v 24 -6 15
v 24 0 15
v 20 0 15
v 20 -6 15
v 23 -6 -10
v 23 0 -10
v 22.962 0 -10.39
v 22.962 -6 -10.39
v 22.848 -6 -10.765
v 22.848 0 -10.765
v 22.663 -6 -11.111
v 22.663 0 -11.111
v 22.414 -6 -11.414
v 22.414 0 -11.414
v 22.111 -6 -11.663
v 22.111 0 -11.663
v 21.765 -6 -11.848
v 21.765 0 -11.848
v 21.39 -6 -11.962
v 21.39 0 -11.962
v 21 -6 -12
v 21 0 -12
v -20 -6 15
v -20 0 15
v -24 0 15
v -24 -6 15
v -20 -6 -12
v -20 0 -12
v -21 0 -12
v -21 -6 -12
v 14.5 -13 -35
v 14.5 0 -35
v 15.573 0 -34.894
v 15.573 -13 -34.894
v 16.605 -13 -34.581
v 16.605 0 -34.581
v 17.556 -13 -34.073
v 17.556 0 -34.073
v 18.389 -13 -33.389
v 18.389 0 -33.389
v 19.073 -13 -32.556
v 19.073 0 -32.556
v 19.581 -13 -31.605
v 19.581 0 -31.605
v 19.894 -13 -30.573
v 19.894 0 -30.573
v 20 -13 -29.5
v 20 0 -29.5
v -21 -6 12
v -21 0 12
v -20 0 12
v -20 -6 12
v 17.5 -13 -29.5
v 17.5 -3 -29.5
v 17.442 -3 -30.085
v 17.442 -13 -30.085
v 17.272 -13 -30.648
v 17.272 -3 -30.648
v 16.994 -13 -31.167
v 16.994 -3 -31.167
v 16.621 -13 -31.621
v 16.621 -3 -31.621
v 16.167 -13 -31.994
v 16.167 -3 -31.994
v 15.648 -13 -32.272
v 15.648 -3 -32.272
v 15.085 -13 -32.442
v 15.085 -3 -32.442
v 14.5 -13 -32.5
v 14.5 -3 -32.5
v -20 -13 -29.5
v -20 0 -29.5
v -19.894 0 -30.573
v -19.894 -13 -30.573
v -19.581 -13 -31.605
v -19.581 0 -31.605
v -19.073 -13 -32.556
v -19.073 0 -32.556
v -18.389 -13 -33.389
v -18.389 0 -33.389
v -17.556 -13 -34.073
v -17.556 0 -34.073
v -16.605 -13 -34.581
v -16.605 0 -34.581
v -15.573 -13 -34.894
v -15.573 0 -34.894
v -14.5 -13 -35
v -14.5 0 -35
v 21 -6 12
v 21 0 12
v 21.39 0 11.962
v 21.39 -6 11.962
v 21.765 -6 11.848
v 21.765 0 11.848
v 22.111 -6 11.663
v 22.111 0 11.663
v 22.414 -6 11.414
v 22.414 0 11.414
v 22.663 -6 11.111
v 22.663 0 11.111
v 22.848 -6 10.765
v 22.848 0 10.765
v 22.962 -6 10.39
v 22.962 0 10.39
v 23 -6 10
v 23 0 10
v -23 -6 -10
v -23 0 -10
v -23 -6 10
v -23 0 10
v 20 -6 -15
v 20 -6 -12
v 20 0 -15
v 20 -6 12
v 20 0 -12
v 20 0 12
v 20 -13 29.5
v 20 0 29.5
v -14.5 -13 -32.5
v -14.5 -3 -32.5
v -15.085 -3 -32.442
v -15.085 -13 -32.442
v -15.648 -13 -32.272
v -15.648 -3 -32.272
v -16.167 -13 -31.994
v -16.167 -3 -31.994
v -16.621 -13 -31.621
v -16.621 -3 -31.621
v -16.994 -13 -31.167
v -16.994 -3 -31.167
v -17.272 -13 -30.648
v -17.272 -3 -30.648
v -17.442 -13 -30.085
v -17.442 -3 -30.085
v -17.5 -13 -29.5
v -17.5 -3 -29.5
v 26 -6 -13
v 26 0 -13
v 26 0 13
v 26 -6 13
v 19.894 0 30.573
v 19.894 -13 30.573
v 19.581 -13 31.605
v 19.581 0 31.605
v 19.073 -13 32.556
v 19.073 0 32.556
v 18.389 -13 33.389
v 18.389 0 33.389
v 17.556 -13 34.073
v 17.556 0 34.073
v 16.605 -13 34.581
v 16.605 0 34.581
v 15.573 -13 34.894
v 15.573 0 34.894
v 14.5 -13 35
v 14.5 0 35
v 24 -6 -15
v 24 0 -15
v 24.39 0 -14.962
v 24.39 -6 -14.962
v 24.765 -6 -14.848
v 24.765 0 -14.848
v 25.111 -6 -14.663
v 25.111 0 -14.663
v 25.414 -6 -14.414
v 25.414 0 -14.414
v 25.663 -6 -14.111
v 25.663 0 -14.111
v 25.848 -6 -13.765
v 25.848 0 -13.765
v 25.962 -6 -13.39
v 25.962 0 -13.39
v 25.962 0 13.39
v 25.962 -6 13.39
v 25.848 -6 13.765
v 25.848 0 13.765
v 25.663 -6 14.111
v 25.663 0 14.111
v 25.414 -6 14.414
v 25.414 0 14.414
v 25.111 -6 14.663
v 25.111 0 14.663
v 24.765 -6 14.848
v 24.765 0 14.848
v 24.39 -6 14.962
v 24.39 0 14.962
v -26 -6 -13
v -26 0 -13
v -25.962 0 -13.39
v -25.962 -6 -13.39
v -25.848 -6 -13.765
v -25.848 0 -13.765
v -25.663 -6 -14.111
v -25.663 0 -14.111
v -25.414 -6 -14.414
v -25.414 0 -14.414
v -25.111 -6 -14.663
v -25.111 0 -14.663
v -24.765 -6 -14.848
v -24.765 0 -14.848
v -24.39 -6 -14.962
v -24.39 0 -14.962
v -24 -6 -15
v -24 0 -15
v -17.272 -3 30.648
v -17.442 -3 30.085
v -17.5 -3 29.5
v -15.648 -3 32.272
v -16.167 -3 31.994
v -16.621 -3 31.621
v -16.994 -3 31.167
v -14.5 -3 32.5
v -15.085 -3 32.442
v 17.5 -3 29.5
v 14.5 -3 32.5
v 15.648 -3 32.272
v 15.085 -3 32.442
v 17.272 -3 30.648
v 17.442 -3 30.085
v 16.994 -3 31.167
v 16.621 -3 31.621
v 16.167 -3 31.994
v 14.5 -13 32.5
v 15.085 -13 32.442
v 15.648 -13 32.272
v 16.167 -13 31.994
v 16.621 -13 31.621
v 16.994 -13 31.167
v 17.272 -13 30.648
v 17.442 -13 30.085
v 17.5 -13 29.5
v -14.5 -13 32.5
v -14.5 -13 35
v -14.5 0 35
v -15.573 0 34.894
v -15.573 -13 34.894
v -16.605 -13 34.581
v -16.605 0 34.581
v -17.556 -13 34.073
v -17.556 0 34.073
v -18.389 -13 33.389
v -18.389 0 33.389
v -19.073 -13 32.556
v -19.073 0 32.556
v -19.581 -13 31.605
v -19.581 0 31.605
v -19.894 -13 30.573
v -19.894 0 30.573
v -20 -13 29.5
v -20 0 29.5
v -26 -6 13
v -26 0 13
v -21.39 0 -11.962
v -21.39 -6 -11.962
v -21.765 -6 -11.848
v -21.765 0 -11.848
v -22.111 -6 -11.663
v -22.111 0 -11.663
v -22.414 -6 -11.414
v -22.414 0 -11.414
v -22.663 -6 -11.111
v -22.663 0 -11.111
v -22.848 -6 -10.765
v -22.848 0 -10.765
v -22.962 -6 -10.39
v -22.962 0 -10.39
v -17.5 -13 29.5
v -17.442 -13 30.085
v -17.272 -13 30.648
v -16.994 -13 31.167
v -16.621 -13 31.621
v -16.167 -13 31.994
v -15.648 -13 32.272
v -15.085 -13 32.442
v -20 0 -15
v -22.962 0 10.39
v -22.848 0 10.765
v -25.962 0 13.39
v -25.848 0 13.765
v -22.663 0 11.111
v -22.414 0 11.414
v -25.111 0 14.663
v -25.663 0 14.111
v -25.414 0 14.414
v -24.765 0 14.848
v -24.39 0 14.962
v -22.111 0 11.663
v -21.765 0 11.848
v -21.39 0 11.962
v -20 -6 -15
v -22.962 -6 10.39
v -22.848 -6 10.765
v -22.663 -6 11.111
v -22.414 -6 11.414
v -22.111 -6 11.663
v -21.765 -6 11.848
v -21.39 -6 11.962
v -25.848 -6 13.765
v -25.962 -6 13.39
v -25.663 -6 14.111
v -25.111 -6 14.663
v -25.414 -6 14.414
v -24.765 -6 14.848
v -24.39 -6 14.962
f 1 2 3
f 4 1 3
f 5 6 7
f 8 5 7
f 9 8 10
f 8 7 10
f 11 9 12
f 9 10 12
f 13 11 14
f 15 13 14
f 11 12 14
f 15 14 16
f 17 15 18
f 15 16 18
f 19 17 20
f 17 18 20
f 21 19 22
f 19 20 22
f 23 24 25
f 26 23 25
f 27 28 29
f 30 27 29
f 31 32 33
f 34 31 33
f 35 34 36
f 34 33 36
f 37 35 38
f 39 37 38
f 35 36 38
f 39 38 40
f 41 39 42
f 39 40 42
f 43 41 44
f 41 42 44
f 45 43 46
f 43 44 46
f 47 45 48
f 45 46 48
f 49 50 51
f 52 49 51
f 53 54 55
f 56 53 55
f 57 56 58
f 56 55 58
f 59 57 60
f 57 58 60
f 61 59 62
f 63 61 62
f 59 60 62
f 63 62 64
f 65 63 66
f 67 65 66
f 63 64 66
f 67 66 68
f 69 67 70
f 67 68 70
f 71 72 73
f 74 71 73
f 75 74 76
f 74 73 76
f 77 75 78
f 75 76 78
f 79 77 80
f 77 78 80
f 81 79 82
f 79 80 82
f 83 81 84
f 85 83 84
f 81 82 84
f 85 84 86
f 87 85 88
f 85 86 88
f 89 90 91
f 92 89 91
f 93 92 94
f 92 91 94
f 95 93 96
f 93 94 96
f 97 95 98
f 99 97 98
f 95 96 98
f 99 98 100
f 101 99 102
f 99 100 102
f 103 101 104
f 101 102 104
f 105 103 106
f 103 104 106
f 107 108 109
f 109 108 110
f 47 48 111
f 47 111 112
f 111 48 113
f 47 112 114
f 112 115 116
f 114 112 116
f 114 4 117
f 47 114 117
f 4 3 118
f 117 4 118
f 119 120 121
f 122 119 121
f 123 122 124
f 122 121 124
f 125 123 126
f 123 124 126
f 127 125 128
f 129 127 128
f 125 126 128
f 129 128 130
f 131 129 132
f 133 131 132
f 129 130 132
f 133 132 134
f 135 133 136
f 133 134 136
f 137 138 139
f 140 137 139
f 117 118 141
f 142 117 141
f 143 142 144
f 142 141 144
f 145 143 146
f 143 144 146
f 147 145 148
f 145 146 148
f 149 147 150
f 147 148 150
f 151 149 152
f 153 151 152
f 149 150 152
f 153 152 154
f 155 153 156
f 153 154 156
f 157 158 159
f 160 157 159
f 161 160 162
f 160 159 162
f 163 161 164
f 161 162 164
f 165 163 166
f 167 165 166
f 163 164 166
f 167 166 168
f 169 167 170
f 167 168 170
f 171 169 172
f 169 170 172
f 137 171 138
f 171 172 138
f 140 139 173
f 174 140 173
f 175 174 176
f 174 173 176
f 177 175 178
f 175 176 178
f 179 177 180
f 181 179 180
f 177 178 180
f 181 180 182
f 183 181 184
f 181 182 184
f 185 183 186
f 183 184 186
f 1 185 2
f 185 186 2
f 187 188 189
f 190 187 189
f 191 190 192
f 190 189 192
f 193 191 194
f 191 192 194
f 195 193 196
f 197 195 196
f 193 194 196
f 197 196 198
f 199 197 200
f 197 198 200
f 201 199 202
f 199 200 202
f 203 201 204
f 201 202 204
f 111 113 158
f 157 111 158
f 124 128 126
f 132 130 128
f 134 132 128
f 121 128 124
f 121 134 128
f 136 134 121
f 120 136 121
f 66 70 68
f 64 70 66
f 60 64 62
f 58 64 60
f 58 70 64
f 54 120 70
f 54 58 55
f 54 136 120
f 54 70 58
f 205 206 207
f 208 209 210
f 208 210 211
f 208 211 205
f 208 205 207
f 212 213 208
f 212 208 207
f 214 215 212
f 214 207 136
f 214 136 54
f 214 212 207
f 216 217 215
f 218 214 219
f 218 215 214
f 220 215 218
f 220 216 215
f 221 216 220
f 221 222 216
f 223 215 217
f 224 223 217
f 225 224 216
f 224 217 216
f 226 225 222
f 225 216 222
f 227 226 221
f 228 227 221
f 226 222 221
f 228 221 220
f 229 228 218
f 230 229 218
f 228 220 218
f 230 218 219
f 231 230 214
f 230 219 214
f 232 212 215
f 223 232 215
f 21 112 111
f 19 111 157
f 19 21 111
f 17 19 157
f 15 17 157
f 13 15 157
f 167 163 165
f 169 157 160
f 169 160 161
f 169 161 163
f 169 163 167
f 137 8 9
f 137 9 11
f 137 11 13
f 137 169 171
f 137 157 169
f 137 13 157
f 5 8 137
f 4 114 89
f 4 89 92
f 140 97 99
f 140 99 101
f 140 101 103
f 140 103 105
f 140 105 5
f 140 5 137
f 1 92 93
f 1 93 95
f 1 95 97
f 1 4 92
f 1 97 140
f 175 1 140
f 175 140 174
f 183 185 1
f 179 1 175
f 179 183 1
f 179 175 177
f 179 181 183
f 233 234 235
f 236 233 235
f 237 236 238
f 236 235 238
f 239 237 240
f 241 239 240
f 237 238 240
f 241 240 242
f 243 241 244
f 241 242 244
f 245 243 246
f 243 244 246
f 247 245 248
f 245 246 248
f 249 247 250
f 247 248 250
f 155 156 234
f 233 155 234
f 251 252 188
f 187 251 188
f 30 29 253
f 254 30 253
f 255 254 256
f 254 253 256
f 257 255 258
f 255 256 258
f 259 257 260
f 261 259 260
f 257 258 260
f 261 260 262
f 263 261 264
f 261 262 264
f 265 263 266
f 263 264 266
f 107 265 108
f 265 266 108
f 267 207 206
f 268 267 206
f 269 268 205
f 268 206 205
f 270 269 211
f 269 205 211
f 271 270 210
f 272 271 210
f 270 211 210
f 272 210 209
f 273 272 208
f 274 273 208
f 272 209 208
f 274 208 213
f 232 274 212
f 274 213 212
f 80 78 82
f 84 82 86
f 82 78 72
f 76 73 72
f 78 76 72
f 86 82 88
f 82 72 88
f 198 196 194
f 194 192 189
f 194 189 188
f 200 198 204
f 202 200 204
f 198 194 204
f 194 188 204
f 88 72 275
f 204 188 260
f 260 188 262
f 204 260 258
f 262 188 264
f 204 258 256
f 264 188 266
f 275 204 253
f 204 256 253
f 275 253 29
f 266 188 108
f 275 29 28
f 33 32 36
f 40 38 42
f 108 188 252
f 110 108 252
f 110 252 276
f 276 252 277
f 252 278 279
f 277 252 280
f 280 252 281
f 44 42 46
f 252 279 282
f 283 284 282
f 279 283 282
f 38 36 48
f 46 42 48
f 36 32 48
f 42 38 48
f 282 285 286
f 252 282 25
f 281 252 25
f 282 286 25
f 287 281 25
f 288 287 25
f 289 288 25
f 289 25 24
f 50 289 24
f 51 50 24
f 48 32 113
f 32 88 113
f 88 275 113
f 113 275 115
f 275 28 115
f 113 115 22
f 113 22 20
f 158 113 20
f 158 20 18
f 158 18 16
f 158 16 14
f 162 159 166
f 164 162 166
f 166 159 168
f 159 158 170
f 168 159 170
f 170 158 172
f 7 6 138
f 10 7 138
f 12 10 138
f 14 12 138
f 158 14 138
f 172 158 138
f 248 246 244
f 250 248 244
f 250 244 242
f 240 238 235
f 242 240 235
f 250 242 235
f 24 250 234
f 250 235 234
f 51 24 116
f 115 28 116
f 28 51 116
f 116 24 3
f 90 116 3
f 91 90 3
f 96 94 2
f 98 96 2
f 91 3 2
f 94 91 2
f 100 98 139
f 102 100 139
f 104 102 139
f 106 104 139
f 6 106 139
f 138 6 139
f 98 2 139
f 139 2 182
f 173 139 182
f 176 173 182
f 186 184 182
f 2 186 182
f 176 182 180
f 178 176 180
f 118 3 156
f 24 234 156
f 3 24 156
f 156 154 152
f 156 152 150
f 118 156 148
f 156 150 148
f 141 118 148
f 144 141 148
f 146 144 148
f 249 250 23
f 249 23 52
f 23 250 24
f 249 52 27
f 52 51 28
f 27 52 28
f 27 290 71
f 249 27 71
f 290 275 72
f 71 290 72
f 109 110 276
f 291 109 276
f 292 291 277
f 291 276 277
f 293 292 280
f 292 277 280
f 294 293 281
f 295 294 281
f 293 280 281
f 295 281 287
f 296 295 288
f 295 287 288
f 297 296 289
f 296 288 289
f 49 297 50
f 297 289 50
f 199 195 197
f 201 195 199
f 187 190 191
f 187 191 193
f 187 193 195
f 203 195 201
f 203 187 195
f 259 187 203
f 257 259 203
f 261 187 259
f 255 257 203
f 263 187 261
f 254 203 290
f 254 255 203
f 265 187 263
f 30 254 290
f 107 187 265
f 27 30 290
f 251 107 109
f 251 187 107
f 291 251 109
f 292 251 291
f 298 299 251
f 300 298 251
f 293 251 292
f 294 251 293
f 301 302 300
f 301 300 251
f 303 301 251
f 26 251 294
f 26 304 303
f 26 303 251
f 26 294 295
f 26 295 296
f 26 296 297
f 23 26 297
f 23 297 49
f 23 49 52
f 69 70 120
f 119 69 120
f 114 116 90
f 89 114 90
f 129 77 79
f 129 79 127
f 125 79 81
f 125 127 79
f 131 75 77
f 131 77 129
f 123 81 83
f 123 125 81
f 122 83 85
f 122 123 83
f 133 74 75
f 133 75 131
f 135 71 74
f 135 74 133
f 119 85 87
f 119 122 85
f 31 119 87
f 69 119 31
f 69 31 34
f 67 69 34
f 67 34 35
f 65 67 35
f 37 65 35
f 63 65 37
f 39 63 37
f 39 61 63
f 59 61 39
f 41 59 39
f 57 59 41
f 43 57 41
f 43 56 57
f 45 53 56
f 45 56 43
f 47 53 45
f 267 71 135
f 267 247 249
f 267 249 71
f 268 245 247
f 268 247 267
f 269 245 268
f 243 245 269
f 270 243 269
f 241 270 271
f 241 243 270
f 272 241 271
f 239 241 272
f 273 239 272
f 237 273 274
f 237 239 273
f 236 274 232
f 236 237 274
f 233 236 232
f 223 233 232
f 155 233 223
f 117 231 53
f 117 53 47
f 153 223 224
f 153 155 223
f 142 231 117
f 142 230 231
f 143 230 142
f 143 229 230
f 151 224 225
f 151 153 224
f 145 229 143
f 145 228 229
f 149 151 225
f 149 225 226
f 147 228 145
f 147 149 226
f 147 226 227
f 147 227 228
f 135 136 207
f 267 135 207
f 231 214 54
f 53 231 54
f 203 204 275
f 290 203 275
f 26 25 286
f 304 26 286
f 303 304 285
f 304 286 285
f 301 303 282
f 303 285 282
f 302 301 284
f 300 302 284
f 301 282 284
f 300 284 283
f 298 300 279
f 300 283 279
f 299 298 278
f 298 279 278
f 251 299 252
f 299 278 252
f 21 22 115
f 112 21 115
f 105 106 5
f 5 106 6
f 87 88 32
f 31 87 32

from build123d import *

# Parameters (mm, degrees)
F1_DEPTH = 3
F2_DEPTH = 13
F3_DEPTH = 6


with BuildPart() as f1:
    # F0 (on Front) → F1 (new body)
    with BuildSketch(Plane.XZ):
        with BuildLine():
            Line((-14.5, -32.5), (14.5, -32.5))
            ThreePointArc((14.5, -32.5), (16.62132, -31.62132), (17.5, -29.5))
            Line((17.5, -29.5), (17.5, 29.5))
            ThreePointArc((17.5, 29.5), (16.62132, 31.62132), (14.5, 32.5))
            Line((14.5, 32.5), (-14.5, 32.5))
            ThreePointArc((-14.5, 32.5), (-16.62132, 31.62132), (-17.5, 29.5))
            Line((-17.5, 29.5), (-17.5, -29.5))
            ThreePointArc((-17.5, -29.5), (-16.62132, -31.62132), (-14.5, -32.5))
        make_face()
    extrude(amount=F1_DEPTH)

    # F0 (on Front) → F2 (join)
    with BuildSketch(Plane.XZ):
        with BuildLine():
            Line((14.5, 35), (-14.5, 35))
            ThreePointArc((-14.5, 35), (-18.389087, 33.389087), (-20, 29.5))
            Line((-20, 29.5), (-20, 15))
            Line((-20, 15), (-20, 12))
            Line((-20, 12), (-20, -12))
            Line((-20, -12), (-20, -15))
            Line((-20, -15), (-20, -29.5))
            ThreePointArc((-20, -29.5), (-18.389087, -33.389087), (-14.5, -35))
            Line((-14.5, -35), (14.5, -35))
            ThreePointArc((14.5, -35), (18.389087, -33.389087), (20, -29.5))
            Line((20, -29.5), (20, -15))
            Line((20, -15), (20, -12))
            Line((20, -12), (20, 12))
            Line((20, 12), (20, 15))
            Line((20, 15), (20, 29.5))
            ThreePointArc((20, 29.5), (18.389087, 33.389087), (14.5, 35))
        make_face()
        with BuildLine():
            ThreePointArc((17.5, -29.5), (16.62132, -31.62132), (14.5, -32.5))
            Line((14.5, -32.5), (-14.5, -32.5))
            ThreePointArc((-14.5, -32.5), (-16.62132, -31.62132), (-17.5, -29.5))
            Line((-17.5, -29.5), (-17.5, 29.5))
            ThreePointArc((-17.5, 29.5), (-16.62132, 31.62132), (-14.5, 32.5))
            Line((-14.5, 32.5), (14.5, 32.5))
            ThreePointArc((14.5, 32.5), (16.62132, 31.62132), (17.5, 29.5))
            Line((17.5, 29.5), (17.5, -29.5))
        make_face(mode=Mode.SUBTRACT)
    extrude(amount=F2_DEPTH)

    # F0 (on Front) → F3 (join)
    with BuildSketch(Plane.XZ):
        with BuildLine():
            Line((-20, 12), (-20, 15))
            Line((-20, 15), (-24, 15))
            ThreePointArc((-24, 15), (-25.414214, 14.414214), (-26, 13))
            Line((-26, 13), (-26, -13))
            ThreePointArc((-26, -13), (-25.414214, -14.414214), (-24, -15))
            Line((-24, -15), (-20, -15))
            Line((-20, -15), (-20, -12))
            Line((-20, -12), (-21, -12))
            ThreePointArc((-21, -12), (-22.414214, -11.414214), (-23, -10))
            Line((-23, -10), (-23, 10))
            ThreePointArc((-23, 10), (-22.414214, 11.414214), (-21, 12))
            Line((-21, 12), (-20, 12))
        make_face()
        with BuildLine():
            Line((24, 15), (20, 15))
            Line((20, 15), (20, 12))
            Line((20, 12), (21, 12))
            ThreePointArc((21, 12), (22.414214, 11.414214), (23, 10))
            Line((23, 10), (23, -10))
            ThreePointArc((23, -10), (22.414214, -11.414214), (21, -12))
            Line((21, -12), (20, -12))
            Line((20, -12), (20, -15))
            Line((20, -15), (24, -15))
            ThreePointArc((24, -15), (25.414214, -14.414214), (26, -13))
            Line((26, -13), (26, 13))
            ThreePointArc((26, 13), (25.414214, 14.414214), (24, 15))
        make_face()
    extrude(amount=F3_DEPTH)


solid = f1.part
